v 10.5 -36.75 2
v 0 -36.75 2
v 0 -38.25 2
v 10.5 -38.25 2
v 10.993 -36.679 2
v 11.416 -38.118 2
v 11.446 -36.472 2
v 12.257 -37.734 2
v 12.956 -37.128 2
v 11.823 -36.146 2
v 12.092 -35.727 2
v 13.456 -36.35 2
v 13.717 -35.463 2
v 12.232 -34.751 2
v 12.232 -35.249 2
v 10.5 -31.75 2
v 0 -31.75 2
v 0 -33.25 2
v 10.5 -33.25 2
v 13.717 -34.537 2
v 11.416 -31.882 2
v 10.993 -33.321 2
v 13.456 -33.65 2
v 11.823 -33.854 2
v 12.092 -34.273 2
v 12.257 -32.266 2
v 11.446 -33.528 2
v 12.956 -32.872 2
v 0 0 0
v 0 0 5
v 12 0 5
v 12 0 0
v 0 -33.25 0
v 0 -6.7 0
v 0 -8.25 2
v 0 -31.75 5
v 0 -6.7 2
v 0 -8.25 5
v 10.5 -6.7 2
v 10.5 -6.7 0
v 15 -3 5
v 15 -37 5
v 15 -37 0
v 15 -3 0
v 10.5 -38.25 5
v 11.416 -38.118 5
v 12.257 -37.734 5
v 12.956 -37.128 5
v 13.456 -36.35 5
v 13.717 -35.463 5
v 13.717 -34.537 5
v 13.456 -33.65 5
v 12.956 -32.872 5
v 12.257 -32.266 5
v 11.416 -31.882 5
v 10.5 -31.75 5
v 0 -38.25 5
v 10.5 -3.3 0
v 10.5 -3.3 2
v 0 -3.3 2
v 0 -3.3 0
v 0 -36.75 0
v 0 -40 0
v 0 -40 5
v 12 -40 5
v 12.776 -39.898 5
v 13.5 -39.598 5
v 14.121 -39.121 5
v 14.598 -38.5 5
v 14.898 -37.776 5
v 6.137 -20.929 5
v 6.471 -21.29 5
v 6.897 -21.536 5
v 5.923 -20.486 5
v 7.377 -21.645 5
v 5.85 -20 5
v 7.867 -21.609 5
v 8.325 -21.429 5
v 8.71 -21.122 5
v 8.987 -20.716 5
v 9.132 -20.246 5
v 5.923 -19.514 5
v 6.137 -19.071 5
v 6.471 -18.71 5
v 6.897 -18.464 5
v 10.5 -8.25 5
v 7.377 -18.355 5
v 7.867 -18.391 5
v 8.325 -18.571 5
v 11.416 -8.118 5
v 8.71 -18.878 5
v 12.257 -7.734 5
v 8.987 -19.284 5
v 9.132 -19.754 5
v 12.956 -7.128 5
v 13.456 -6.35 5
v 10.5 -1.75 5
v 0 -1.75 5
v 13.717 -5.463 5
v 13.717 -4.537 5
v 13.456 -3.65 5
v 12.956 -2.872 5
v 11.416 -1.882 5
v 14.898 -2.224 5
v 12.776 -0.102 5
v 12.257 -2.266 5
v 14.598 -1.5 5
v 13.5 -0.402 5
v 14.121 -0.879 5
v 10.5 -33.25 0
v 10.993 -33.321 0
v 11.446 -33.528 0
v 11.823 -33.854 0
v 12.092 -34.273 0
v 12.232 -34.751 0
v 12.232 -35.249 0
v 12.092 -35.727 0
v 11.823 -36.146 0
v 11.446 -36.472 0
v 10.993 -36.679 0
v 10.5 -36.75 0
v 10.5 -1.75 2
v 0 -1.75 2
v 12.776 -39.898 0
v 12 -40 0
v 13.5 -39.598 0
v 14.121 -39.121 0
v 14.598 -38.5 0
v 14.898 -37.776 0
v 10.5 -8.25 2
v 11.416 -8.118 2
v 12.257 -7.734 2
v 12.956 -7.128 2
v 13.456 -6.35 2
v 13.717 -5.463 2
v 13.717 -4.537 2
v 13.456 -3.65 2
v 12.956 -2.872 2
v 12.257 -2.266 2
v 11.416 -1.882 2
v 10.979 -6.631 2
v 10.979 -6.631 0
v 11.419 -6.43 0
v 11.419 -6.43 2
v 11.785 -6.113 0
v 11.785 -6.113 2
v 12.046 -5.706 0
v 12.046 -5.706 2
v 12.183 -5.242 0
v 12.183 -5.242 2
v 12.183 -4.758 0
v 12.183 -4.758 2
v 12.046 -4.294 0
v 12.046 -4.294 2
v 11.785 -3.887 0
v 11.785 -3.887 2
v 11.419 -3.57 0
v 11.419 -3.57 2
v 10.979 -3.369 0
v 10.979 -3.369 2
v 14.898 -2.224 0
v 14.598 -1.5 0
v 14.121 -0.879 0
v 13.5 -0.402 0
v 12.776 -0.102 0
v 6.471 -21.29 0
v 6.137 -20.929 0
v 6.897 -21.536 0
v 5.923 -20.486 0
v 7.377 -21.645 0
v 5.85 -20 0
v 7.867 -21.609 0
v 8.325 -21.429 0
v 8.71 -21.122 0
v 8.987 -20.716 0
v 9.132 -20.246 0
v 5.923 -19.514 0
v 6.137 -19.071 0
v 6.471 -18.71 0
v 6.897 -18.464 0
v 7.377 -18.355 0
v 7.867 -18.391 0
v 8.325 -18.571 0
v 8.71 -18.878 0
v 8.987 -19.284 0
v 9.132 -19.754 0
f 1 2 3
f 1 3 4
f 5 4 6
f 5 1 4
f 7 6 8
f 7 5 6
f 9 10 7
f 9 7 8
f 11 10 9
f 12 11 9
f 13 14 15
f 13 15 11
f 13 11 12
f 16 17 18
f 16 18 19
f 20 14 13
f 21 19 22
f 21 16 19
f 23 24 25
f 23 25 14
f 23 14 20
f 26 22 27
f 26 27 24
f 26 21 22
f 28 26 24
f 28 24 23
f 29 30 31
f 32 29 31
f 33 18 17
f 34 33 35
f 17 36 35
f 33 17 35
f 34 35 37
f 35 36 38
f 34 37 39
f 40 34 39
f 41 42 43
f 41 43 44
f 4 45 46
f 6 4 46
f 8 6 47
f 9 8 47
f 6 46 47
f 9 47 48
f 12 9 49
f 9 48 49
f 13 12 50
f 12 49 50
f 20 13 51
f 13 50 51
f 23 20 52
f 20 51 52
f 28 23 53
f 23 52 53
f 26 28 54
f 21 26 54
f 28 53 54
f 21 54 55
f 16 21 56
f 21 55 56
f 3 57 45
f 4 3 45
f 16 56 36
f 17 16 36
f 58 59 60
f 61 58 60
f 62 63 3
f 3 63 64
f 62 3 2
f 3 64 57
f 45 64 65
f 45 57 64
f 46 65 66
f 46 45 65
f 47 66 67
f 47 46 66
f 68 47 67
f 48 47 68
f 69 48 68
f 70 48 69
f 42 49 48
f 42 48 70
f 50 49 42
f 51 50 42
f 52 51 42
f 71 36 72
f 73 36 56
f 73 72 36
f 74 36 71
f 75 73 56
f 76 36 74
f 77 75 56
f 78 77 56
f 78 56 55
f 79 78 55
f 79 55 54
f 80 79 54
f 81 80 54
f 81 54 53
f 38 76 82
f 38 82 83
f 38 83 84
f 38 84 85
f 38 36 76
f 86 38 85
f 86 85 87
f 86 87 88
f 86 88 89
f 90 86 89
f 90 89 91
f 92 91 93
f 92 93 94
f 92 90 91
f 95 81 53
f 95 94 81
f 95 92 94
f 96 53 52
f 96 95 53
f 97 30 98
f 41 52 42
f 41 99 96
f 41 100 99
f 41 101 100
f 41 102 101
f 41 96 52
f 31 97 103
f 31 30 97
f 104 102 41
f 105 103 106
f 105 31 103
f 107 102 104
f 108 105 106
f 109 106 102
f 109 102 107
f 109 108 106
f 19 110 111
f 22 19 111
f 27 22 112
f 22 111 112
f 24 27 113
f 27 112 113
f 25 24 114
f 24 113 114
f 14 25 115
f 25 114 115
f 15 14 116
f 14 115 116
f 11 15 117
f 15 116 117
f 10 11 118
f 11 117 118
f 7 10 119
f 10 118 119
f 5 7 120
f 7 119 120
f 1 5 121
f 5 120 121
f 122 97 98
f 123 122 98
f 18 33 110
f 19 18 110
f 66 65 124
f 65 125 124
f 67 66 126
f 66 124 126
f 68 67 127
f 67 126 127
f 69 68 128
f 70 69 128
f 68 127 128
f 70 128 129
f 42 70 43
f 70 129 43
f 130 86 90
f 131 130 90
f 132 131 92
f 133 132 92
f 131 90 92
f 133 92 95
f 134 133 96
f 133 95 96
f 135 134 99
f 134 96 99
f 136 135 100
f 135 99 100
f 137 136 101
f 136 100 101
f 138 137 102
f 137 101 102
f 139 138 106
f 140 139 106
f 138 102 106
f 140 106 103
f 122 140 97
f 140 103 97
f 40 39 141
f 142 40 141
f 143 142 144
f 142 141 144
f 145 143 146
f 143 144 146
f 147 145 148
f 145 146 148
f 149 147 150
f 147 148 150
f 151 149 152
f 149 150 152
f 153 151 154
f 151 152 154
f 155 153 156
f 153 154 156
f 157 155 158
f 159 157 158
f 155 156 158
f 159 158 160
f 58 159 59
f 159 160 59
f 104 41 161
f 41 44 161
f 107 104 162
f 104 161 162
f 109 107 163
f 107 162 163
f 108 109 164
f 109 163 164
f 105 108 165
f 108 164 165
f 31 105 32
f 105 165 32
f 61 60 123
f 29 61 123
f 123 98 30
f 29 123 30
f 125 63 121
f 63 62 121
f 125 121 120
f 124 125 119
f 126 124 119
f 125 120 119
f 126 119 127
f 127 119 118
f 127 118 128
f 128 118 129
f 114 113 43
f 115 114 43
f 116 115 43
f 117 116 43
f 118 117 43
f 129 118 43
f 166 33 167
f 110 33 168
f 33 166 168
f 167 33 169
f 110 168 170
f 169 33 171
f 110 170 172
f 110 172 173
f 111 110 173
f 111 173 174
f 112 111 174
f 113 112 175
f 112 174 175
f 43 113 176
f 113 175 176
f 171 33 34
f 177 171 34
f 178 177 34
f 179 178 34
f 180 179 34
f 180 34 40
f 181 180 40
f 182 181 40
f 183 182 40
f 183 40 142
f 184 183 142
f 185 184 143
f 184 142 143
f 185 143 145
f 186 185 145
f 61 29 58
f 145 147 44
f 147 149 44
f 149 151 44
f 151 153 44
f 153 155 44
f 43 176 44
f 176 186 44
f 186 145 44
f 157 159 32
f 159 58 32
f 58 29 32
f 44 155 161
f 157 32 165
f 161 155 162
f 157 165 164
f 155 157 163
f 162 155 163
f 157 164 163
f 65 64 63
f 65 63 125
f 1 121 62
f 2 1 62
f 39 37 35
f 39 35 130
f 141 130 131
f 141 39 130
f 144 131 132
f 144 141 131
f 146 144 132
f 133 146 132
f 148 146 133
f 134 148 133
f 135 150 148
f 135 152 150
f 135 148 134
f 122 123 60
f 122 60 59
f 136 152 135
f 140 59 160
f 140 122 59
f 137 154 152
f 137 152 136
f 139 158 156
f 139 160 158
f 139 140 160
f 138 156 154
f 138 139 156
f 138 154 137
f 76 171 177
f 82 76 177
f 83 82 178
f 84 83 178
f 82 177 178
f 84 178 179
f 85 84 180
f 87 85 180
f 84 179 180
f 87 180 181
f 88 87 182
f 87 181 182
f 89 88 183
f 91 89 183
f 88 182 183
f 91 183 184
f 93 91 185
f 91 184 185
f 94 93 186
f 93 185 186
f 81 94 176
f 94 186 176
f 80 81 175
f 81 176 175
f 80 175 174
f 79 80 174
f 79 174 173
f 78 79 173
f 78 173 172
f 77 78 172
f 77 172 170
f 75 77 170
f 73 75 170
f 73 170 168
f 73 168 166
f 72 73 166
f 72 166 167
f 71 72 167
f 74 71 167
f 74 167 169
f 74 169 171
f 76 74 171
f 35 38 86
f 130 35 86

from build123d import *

# Parameters (mm, degrees)
SKETCH1_W                 = 15
SKETCH1_H                 = 40
BOSS_EXTRUDE1_DEPTH       = 5
CUT_EXTRUDE1_DEPTH        = 3
CUT_EXTRUDE2_DEPTH        = 3
CUT_EXTRUDE3_DEPTH        = 3
CUT_EXTRUDE4_DEPTH        = 6
F_4_CLEARANCE_HOLE1_D     = 3.3
F_4_CLEARANCE_HOLE1_DEPTH = 5
FILLET1_R                 = 3


with BuildPart() as part:
    # Sketch1 → Boss-Extrude1 (new body)
    with BuildSketch(Plane.XY.offset(5)):
        with Locations((7.5, -20)):
            Rectangle(SKETCH1_W, SKETCH1_H)
    extrude(amount=-BOSS_EXTRUDE1_DEPTH)

    # Sketch2 → Cut-Extrude1 (cut)
    with BuildSketch(Plane.XY.offset(5)):
        with BuildLine():
            Line((0, -8.25), (10.5, -8.25))
            ThreePointArc((10.5, -8.25), (13.75, -5), (10.5, -1.75))
            Line((10.5, -1.75), (0, -1.75))
            Line((0, -1.75), (0, -8.25))
        make_face()
    extrude(amount=-CUT_EXTRUDE1_DEPTH, mode=Mode.SUBTRACT)

    # Sketch3 → Cut-Extrude2 (cut, through all)
    with BuildSketch(Plane.XY.offset(2)):
        with BuildLine():
            Line((0, -3.3), (0, -6.7))
            Line((0, -6.7), (10.5, -6.7))
            ThreePointArc((10.5, -6.7), (12.2, -5), (10.5, -3.3))
            Line((10.5, -3.3), (0, -3.3))
        make_face()
    extrude(amount=-CUT_EXTRUDE2_DEPTH, mode=Mode.SUBTRACT)

    # Sketch4 → Cut-Extrude3 (cut)
    with BuildSketch(Plane.XY.offset(5)):
        with BuildLine():
            Line((0, -38.25), (10.5, -38.25))
            ThreePointArc((10.5, -38.25), (13.75, -35), (10.5, -31.75))
            Line((10.5, -31.75), (0, -31.75))
            Line((0, -31.75), (0, -38.25))
        make_face()
    extrude(amount=-CUT_EXTRUDE3_DEPTH, mode=Mode.SUBTRACT)

    # Sketch5 → Cut-Extrude4 (cut, through all)
    with BuildSketch(Plane(origin=(0, 0, 0), x_dir=(-1, 0, 0), z_dir=(0, 0, -1))):
        with BuildLine():
            Line((0, -36.75), (0, -33.25))
            Line((0, -33.25), (-10.5, -33.25))
            ThreePointArc((-10.5, -33.25), (-12.25, -35), (-10.5, -36.75))
            Line((-10.5, -36.75), (0, -36.75))
        make_face()
    extrude(amount=-CUT_EXTRUDE4_DEPTH, mode=Mode.SUBTRACT)

    # #4 Clearance Hole1
    with Locations(Plane.XY.offset(5)):
        with Locations((7.5, -20)):
            Hole(F_4_CLEARANCE_HOLE1_D / 2, depth=F_4_CLEARANCE_HOLE1_DEPTH)

    # Fillet1
    fillet1_edges = [part.edges().sort_by_distance(p)[0] for p in [
        (15, -40, 2.5),
        (15, 0, 2.5),
    ]]
    fillet(fillet1_edges, radius=FILLET1_R)


solid = part.part
